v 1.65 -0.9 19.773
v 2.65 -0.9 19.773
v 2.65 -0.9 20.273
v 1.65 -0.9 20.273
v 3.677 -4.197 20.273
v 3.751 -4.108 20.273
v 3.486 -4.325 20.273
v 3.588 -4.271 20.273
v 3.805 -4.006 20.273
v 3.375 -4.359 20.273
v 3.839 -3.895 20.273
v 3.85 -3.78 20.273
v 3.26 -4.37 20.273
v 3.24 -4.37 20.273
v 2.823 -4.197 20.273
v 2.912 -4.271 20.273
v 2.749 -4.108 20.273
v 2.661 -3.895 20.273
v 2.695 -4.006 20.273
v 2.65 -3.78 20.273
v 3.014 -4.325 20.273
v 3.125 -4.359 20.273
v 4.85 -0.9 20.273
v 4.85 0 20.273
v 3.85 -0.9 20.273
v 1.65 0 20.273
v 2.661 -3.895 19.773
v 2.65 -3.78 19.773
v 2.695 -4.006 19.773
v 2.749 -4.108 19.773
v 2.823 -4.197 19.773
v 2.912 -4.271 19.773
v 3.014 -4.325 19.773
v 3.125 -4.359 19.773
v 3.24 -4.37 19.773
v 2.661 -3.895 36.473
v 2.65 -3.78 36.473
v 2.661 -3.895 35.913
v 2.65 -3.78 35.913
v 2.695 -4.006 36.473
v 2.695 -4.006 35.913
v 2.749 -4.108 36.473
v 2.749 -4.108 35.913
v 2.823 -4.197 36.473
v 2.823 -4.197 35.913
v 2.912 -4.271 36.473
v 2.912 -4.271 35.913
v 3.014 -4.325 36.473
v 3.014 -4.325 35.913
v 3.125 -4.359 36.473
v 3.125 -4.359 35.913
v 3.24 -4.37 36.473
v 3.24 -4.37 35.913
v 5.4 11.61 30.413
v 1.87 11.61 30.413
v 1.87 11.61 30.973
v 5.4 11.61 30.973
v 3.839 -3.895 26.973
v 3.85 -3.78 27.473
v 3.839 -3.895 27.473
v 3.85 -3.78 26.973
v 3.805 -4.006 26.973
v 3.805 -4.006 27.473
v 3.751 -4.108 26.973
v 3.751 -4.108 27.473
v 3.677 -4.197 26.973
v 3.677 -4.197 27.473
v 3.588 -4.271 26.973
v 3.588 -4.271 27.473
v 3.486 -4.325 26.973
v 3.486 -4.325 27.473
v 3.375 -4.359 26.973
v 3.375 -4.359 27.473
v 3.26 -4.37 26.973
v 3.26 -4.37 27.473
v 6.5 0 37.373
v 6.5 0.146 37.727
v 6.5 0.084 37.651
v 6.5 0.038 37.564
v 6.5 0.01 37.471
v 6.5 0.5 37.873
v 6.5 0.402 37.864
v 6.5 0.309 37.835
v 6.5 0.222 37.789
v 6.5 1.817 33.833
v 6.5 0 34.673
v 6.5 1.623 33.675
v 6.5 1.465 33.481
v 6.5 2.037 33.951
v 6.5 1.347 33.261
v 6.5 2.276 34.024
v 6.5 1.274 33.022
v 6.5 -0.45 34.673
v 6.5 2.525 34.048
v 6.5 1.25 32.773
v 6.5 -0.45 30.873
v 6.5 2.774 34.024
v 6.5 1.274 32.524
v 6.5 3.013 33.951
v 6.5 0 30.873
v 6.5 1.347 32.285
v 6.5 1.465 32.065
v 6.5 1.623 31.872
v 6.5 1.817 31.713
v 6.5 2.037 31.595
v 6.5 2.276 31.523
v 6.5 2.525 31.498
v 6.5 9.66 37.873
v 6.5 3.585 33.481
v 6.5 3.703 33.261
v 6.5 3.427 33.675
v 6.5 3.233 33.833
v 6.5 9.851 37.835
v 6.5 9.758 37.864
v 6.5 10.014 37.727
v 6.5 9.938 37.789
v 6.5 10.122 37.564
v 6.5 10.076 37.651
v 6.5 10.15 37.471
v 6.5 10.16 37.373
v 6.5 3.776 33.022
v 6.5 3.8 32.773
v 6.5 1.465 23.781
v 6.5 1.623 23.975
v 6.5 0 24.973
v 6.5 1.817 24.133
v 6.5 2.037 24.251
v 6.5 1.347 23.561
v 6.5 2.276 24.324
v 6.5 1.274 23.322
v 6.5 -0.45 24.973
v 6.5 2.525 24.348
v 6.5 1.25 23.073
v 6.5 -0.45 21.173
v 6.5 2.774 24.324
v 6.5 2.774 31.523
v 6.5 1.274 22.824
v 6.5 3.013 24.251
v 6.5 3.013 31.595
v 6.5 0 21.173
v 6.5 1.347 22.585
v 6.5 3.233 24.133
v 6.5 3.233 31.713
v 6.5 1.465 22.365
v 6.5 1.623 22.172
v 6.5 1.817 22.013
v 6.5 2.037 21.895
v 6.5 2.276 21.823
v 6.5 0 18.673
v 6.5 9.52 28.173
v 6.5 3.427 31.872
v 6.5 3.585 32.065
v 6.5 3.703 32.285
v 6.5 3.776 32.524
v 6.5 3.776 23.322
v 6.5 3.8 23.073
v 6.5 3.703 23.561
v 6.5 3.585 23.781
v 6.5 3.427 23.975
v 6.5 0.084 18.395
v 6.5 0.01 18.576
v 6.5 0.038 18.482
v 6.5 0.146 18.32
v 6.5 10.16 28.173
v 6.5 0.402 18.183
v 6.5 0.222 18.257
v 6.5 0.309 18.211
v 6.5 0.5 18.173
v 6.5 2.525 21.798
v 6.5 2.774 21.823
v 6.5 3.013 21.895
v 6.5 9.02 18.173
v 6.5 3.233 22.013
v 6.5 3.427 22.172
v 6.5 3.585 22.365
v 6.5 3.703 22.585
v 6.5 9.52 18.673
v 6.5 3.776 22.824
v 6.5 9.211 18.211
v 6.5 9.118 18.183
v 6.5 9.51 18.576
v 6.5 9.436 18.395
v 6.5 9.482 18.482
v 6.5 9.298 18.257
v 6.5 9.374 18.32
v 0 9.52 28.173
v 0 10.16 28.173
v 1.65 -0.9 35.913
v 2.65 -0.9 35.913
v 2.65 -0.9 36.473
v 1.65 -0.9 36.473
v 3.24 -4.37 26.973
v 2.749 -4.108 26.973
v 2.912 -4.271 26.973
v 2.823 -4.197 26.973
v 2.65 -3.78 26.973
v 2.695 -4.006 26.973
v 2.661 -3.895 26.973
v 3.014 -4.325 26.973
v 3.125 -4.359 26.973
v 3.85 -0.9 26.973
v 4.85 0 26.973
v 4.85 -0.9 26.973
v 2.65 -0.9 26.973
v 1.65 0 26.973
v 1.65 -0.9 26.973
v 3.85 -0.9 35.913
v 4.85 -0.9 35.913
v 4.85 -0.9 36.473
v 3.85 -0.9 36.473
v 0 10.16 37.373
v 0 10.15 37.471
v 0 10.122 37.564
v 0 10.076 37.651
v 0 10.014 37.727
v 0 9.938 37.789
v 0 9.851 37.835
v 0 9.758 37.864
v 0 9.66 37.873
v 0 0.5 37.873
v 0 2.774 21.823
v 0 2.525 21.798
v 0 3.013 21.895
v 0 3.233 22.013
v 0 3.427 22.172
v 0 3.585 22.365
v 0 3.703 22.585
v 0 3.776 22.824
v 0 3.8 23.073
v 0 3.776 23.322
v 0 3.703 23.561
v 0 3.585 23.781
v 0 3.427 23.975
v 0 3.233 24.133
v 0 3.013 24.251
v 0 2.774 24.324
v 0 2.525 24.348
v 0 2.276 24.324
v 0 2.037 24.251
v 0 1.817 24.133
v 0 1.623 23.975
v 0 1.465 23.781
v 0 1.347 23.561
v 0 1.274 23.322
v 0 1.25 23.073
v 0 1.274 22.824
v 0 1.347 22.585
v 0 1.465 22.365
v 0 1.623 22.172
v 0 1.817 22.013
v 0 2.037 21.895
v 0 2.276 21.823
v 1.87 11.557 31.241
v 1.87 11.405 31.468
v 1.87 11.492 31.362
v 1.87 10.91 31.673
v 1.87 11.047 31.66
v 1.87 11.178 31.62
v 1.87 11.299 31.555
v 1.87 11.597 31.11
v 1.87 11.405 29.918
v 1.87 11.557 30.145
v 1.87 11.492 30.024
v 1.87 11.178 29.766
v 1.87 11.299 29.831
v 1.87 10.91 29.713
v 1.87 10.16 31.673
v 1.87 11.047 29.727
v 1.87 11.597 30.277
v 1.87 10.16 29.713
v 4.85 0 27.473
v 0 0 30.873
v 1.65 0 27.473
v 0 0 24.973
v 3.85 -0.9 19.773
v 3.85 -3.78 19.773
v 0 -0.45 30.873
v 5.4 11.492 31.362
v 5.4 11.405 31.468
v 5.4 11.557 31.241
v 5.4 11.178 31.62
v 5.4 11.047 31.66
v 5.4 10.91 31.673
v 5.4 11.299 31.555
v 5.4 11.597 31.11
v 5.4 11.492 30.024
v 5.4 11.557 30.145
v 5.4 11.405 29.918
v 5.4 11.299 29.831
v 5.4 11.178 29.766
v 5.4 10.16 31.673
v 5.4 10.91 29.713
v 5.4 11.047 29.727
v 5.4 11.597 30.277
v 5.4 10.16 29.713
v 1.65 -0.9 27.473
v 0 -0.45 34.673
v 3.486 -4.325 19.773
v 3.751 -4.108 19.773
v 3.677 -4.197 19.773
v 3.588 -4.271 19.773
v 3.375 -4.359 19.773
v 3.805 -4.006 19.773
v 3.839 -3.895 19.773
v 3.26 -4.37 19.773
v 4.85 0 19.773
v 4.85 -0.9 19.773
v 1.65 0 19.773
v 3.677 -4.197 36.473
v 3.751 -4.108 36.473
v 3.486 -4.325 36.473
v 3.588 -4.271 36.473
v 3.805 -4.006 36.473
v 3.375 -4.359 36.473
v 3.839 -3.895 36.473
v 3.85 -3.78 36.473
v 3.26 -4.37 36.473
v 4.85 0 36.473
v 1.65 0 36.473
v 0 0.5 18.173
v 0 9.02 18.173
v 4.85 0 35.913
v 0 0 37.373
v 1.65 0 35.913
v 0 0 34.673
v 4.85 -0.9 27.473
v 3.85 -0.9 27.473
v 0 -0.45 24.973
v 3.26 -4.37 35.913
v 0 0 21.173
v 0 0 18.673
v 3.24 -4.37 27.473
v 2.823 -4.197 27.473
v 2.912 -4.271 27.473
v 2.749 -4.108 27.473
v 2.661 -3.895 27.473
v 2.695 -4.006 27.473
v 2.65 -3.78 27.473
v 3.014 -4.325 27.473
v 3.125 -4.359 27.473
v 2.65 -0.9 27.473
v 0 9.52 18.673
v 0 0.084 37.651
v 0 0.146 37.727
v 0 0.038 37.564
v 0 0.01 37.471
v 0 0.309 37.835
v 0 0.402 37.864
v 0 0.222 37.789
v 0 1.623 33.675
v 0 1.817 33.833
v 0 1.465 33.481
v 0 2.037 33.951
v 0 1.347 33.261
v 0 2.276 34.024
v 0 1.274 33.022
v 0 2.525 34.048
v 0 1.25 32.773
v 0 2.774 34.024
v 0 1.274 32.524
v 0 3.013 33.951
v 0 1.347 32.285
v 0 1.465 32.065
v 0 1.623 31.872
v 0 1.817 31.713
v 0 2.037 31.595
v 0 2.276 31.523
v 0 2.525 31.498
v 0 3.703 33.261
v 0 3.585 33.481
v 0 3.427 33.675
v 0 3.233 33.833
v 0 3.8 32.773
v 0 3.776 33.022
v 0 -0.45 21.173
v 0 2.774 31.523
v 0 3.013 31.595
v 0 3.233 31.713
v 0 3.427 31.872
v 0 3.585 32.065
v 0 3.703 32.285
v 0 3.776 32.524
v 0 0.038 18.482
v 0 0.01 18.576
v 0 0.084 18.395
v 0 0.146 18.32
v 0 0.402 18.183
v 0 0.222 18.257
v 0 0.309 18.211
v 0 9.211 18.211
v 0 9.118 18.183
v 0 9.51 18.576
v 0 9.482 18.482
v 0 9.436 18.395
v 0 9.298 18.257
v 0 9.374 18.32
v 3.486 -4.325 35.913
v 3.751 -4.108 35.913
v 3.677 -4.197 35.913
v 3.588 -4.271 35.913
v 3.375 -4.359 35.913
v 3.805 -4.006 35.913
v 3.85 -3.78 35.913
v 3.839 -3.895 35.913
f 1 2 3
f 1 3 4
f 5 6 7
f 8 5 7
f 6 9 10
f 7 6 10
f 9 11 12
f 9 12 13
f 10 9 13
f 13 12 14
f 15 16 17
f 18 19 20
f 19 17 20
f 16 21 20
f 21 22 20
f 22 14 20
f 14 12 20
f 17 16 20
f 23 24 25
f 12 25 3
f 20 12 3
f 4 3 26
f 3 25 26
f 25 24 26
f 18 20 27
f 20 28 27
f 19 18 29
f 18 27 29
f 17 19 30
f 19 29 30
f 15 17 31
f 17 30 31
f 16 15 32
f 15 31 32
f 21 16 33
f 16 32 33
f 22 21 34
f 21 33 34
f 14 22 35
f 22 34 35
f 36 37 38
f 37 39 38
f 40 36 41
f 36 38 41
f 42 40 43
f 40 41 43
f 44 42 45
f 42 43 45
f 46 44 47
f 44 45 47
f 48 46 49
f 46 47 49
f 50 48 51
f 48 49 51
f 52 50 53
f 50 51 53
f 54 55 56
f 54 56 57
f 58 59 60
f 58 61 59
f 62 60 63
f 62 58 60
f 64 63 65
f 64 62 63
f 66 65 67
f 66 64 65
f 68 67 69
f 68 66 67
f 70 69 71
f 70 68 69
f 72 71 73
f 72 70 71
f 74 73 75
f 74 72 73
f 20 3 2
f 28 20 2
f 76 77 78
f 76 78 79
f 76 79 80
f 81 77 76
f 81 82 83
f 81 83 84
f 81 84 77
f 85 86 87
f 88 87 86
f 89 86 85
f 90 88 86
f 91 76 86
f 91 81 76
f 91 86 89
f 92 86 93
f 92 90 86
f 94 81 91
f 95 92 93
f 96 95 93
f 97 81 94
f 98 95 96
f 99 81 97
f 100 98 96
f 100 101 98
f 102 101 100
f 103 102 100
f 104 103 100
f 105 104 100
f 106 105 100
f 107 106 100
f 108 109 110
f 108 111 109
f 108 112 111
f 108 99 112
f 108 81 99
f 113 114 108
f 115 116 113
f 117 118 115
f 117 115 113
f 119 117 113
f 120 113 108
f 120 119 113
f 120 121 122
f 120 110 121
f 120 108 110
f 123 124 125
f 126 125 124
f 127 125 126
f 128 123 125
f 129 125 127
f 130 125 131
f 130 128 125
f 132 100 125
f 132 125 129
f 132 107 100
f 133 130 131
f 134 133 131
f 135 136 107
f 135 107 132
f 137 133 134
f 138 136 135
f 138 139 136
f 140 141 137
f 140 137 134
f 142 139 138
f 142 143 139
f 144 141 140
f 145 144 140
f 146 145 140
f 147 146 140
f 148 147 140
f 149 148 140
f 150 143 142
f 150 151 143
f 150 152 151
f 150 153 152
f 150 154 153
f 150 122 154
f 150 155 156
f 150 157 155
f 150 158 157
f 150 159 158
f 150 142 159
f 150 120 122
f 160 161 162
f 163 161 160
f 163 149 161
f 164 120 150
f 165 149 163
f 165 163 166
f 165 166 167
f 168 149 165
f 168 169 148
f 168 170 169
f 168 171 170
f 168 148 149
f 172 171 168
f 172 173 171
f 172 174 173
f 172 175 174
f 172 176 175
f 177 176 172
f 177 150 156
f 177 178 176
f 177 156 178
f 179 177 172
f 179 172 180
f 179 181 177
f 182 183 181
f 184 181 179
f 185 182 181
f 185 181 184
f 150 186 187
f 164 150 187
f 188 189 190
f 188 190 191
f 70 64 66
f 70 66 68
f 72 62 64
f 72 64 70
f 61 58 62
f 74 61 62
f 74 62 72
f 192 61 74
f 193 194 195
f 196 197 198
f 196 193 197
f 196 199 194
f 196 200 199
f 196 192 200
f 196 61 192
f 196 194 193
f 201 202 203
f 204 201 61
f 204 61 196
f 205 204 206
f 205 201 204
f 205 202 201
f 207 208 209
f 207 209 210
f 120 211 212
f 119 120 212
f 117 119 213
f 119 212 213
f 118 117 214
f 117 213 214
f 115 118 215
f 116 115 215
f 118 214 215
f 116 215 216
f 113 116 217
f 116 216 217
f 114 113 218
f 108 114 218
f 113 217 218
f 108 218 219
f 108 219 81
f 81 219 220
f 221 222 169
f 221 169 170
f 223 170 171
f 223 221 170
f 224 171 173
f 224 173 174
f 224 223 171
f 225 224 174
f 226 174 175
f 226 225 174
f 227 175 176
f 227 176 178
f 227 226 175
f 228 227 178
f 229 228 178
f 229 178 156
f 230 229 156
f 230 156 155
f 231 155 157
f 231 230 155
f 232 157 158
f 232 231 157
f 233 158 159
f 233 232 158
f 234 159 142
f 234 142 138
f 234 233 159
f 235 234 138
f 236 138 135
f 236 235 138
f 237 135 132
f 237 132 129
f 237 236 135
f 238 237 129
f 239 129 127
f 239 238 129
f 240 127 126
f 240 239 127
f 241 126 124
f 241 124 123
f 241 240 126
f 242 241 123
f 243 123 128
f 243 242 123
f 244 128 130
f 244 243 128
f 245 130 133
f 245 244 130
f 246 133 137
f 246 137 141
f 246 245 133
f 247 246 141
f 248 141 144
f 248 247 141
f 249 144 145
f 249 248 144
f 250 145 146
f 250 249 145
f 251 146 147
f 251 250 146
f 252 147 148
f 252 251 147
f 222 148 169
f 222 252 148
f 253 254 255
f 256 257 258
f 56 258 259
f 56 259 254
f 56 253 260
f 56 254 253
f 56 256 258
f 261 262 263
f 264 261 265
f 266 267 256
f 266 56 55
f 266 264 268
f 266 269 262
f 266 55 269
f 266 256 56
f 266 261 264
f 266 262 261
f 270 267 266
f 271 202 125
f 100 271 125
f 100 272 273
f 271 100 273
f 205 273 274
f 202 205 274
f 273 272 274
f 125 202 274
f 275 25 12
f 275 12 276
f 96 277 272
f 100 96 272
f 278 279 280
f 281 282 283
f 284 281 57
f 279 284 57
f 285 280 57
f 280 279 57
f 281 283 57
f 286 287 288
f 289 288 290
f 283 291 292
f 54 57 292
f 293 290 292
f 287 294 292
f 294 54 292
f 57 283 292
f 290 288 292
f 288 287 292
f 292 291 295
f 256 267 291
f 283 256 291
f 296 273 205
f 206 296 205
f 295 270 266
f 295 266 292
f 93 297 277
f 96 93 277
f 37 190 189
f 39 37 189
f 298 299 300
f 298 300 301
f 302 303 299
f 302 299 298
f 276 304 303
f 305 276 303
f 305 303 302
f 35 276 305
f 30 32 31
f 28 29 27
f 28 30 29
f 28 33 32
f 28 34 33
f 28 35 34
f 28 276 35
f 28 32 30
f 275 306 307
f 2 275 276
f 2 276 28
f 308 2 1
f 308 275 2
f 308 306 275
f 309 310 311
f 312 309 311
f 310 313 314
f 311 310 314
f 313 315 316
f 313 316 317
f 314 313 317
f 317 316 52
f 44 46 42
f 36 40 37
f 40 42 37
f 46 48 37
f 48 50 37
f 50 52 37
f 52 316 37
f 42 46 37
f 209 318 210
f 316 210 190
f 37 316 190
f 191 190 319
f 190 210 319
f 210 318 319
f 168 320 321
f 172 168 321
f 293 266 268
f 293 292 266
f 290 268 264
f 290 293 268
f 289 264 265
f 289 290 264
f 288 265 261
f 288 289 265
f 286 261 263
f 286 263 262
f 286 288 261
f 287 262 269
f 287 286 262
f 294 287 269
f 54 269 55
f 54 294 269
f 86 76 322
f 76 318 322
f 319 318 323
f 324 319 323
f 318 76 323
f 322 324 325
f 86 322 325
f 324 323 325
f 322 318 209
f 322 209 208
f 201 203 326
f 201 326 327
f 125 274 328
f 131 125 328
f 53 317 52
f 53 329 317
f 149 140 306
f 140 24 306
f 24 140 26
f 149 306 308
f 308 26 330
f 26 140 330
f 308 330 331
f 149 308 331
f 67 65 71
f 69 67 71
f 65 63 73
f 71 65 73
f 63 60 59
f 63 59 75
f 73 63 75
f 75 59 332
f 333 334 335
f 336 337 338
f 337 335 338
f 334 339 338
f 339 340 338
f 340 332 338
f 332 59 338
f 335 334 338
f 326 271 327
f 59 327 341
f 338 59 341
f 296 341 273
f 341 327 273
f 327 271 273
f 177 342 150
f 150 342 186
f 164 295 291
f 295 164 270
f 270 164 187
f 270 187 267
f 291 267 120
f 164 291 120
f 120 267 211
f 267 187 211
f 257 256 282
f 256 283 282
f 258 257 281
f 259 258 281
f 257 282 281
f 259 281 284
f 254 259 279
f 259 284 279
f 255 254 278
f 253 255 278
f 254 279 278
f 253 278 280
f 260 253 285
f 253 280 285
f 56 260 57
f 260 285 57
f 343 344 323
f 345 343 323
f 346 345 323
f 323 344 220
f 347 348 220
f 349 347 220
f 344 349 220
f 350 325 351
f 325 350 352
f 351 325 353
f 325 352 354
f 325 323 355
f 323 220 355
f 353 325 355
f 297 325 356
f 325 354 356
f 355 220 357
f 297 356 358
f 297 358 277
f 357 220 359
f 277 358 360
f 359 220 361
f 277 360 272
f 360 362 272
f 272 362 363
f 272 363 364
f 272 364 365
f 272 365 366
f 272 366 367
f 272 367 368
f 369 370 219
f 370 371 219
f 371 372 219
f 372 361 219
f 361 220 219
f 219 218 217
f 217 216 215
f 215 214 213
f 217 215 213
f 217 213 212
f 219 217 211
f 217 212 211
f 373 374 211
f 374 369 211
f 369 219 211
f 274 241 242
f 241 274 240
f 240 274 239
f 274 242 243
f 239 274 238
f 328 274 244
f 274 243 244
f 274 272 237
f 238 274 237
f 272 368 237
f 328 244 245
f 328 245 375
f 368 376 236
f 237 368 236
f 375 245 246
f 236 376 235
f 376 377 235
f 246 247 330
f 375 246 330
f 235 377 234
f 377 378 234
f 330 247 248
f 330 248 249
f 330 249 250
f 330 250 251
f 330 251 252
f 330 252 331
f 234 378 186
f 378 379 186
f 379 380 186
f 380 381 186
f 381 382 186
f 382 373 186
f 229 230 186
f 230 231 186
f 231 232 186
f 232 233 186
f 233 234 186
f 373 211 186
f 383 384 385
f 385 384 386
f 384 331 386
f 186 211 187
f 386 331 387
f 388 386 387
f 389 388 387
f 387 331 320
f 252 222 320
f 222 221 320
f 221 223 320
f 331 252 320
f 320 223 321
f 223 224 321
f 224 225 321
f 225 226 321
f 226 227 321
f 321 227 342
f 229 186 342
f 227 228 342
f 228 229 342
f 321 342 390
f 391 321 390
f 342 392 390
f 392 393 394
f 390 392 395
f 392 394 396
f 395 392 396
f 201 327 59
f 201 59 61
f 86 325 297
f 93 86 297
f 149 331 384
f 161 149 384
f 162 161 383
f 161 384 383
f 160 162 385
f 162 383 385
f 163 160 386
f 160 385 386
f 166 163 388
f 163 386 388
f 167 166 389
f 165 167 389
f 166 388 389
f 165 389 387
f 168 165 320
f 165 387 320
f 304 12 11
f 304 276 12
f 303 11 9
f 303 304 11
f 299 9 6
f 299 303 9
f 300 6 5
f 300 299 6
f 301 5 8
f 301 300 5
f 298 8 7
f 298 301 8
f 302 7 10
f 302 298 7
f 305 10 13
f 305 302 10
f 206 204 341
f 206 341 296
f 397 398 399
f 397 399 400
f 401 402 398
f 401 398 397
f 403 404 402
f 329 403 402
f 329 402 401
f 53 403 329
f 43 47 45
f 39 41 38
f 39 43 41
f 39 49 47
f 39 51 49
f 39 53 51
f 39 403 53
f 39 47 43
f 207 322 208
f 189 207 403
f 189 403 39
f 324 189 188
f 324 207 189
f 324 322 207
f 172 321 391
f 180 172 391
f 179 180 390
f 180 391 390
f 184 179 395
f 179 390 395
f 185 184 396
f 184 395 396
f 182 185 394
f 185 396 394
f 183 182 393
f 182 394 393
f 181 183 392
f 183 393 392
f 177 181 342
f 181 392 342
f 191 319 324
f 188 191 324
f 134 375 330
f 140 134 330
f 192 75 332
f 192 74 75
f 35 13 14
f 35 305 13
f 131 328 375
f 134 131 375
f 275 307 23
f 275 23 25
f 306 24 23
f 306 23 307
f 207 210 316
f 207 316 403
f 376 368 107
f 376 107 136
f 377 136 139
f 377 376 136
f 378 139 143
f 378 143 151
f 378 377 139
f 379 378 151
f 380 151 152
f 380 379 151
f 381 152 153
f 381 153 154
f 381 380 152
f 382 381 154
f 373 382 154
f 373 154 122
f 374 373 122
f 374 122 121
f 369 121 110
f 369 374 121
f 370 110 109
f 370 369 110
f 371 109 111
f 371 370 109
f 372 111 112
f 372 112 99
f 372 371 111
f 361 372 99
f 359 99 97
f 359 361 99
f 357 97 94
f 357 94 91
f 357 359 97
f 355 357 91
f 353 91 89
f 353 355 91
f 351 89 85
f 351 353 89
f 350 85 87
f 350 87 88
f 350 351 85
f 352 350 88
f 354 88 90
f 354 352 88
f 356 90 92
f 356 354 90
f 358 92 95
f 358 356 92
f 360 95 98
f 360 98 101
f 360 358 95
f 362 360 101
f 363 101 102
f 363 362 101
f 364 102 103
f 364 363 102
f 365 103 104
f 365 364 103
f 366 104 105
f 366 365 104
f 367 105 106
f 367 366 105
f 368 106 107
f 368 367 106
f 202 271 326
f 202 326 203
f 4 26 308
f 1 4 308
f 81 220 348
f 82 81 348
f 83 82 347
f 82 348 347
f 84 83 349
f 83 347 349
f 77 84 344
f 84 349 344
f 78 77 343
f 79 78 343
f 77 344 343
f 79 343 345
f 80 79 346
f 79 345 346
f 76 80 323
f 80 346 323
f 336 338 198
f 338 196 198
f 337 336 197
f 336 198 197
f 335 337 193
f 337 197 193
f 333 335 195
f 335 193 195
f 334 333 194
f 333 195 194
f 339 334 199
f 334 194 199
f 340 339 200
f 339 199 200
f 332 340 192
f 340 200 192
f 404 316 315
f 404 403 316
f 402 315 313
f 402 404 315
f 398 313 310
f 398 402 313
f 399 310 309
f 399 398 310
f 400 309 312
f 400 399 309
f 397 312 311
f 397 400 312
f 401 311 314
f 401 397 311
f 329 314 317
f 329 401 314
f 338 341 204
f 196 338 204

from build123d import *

# Parameters (mm, degrees)
SKETCH1_R           = 1.275
BOSS_EXTRUDE1_DEPTH = 6.5
SKETCH2_W           = 3.53
SKETCH2_H           = 1.96
BOSS_EXTRUDE2_DEPTH = 1.45
FILLET1_R           = 0.7
SKETCH3_W           = 3.2
SKETCH3_H           = 0.56
SKETCH3_H_2         = 0.5
BOSS_EXTRUDE3_DEPTH = 0.9
SKETCH4_W           = 1.2
SKETCH4_H           = 0.56
SKETCH4_H_2         = 0.5
BOSS_EXTRUDE4_DEPTH = 3.47
FILLET2_R           = 0.59


with BuildPart() as part:
    # Sketch1 → Boss-Extrude1 (new body)
    with BuildSketch(Plane(origin=(0, 0, 0), x_dir=(0, 0, -1), z_dir=(1, 0, 0))):
        with BuildLine():
            Line((-37.373122581, 0), (-34.673122581, 0))
            Line((-34.673122581, 0), (-34.673122581, -0.45))
            Line((-34.673122581, -0.45), (-30.873122581, -0.45))
            Line((-30.873122581, -0.45), (-30.873122581, 0))
            Line((-30.873122581, 0), (-24.973122581, 0))
            Line((-24.973122581, 0), (-24.973122581, -0.45))
            Line((-24.973122581, -0.45), (-21.173122581, -0.45))
            Line((-21.173122581, -0.45), (-21.173122581, 0))
            Line((-21.173122581, 0), (-18.673122581, 0))
            ThreePointArc((-18.673122581, 0), (-18.31956919, 0.146446609), (-18.173122581, 0.5))
            Line((-18.173122581, 0.5), (-18.173122581, 9.02))
            ThreePointArc((-18.173122581, 9.02), (-18.31956919, 9.373553391), (-18.673122581, 9.52))
            Line((-18.673122581, 9.52), (-28.173122581, 9.52))
            Line((-28.173122581, 9.52), (-28.173122581, 10.16))
            Line((-28.173122581, 10.16), (-37.373122581, 10.16))
            ThreePointArc((-37.373122581, 10.16), (-37.726675972, 10.013553391), (-37.873122581, 9.66))
            Line((-37.873122581, 9.66), (-37.873122581, 0.5))
            ThreePointArc((-37.873122581, 0.5), (-37.726675972, 0.146446609), (-37.373122581, 0))
        make_face()
        with Locations((-32.773122581, 2.525)):
            Circle(SKETCH1_R, mode=Mode.SUBTRACT)
        with Locations((-23.073122581, 2.525)):
            Circle(SKETCH1_R, mode=Mode.SUBTRACT)
    extrude(amount=BOSS_EXTRUDE1_DEPTH)

    # Sketch2 → Boss-Extrude2 (add)
    with BuildSketch(Plane(origin=(0, 10.16, 0), x_dir=(1, 0, 0), z_dir=(0, 1, 0))):
        with Locations((3.635, -30.693122581)):
            Rectangle(SKETCH2_W, SKETCH2_H)
    extrude(amount=BOSS_EXTRUDE2_DEPTH)

    # Fillet1
    fillet1_edges = [part.edges().sort_by_distance(p)[0] for p in [
        (3.635, 11.61, 31.673122581),
        (3.635, 11.61, 29.713122581),
    ]]
    fillet(fillet1_edges, radius=FILLET1_R)

    # Sketch3 → Boss-Extrude3 (add)
    with BuildSketch(Plane(origin=(0, 0, 0), x_dir=(-1, 0, 0), z_dir=(0, -1, 0))):
        with Locations((-3.25, -36.193122581)):
            Rectangle(SKETCH3_W, SKETCH3_H)
        with Locations((-3.25, -27.223122581)):
            Rectangle(SKETCH3_W, SKETCH3_H_2)
        with Locations((-3.25, -20.023122581)):
            Rectangle(SKETCH3_W, SKETCH3_H_2)
    extrude(amount=BOSS_EXTRUDE3_DEPTH)

    # Sketch4 → Boss-Extrude4 (add)
    with BuildSketch(Plane(origin=(0, -0.9, 0), x_dir=(-1, 0, 0), z_dir=(0, -1, 0))):
        with Locations((-3.25, -36.193122581)):
            Rectangle(SKETCH4_W, SKETCH4_H)
        with Locations((-3.25, -27.223122581)):
            Rectangle(SKETCH4_W, SKETCH4_H_2)
        with Locations((-3.25, -20.023122581)):
            Rectangle(SKETCH4_W, SKETCH4_H_2)
    extrude(amount=BOSS_EXTRUDE4_DEPTH)

    # Fillet2
    fillet2_edges = [part.edges().sort_by_distance(p)[0] for p in [
        (2.65, -4.37, 36.193122581),
        (3.85, -4.37, 36.193122581),
        (2.65, -4.37, 27.223122581),
        (3.85, -4.37, 27.223122581),
        (3.85, -4.37, 20.023122581),
        (2.65, -4.37, 20.023122581),
    ]]
    fillet(fillet2_edges, radius=FILLET2_R)


solid = part.part
